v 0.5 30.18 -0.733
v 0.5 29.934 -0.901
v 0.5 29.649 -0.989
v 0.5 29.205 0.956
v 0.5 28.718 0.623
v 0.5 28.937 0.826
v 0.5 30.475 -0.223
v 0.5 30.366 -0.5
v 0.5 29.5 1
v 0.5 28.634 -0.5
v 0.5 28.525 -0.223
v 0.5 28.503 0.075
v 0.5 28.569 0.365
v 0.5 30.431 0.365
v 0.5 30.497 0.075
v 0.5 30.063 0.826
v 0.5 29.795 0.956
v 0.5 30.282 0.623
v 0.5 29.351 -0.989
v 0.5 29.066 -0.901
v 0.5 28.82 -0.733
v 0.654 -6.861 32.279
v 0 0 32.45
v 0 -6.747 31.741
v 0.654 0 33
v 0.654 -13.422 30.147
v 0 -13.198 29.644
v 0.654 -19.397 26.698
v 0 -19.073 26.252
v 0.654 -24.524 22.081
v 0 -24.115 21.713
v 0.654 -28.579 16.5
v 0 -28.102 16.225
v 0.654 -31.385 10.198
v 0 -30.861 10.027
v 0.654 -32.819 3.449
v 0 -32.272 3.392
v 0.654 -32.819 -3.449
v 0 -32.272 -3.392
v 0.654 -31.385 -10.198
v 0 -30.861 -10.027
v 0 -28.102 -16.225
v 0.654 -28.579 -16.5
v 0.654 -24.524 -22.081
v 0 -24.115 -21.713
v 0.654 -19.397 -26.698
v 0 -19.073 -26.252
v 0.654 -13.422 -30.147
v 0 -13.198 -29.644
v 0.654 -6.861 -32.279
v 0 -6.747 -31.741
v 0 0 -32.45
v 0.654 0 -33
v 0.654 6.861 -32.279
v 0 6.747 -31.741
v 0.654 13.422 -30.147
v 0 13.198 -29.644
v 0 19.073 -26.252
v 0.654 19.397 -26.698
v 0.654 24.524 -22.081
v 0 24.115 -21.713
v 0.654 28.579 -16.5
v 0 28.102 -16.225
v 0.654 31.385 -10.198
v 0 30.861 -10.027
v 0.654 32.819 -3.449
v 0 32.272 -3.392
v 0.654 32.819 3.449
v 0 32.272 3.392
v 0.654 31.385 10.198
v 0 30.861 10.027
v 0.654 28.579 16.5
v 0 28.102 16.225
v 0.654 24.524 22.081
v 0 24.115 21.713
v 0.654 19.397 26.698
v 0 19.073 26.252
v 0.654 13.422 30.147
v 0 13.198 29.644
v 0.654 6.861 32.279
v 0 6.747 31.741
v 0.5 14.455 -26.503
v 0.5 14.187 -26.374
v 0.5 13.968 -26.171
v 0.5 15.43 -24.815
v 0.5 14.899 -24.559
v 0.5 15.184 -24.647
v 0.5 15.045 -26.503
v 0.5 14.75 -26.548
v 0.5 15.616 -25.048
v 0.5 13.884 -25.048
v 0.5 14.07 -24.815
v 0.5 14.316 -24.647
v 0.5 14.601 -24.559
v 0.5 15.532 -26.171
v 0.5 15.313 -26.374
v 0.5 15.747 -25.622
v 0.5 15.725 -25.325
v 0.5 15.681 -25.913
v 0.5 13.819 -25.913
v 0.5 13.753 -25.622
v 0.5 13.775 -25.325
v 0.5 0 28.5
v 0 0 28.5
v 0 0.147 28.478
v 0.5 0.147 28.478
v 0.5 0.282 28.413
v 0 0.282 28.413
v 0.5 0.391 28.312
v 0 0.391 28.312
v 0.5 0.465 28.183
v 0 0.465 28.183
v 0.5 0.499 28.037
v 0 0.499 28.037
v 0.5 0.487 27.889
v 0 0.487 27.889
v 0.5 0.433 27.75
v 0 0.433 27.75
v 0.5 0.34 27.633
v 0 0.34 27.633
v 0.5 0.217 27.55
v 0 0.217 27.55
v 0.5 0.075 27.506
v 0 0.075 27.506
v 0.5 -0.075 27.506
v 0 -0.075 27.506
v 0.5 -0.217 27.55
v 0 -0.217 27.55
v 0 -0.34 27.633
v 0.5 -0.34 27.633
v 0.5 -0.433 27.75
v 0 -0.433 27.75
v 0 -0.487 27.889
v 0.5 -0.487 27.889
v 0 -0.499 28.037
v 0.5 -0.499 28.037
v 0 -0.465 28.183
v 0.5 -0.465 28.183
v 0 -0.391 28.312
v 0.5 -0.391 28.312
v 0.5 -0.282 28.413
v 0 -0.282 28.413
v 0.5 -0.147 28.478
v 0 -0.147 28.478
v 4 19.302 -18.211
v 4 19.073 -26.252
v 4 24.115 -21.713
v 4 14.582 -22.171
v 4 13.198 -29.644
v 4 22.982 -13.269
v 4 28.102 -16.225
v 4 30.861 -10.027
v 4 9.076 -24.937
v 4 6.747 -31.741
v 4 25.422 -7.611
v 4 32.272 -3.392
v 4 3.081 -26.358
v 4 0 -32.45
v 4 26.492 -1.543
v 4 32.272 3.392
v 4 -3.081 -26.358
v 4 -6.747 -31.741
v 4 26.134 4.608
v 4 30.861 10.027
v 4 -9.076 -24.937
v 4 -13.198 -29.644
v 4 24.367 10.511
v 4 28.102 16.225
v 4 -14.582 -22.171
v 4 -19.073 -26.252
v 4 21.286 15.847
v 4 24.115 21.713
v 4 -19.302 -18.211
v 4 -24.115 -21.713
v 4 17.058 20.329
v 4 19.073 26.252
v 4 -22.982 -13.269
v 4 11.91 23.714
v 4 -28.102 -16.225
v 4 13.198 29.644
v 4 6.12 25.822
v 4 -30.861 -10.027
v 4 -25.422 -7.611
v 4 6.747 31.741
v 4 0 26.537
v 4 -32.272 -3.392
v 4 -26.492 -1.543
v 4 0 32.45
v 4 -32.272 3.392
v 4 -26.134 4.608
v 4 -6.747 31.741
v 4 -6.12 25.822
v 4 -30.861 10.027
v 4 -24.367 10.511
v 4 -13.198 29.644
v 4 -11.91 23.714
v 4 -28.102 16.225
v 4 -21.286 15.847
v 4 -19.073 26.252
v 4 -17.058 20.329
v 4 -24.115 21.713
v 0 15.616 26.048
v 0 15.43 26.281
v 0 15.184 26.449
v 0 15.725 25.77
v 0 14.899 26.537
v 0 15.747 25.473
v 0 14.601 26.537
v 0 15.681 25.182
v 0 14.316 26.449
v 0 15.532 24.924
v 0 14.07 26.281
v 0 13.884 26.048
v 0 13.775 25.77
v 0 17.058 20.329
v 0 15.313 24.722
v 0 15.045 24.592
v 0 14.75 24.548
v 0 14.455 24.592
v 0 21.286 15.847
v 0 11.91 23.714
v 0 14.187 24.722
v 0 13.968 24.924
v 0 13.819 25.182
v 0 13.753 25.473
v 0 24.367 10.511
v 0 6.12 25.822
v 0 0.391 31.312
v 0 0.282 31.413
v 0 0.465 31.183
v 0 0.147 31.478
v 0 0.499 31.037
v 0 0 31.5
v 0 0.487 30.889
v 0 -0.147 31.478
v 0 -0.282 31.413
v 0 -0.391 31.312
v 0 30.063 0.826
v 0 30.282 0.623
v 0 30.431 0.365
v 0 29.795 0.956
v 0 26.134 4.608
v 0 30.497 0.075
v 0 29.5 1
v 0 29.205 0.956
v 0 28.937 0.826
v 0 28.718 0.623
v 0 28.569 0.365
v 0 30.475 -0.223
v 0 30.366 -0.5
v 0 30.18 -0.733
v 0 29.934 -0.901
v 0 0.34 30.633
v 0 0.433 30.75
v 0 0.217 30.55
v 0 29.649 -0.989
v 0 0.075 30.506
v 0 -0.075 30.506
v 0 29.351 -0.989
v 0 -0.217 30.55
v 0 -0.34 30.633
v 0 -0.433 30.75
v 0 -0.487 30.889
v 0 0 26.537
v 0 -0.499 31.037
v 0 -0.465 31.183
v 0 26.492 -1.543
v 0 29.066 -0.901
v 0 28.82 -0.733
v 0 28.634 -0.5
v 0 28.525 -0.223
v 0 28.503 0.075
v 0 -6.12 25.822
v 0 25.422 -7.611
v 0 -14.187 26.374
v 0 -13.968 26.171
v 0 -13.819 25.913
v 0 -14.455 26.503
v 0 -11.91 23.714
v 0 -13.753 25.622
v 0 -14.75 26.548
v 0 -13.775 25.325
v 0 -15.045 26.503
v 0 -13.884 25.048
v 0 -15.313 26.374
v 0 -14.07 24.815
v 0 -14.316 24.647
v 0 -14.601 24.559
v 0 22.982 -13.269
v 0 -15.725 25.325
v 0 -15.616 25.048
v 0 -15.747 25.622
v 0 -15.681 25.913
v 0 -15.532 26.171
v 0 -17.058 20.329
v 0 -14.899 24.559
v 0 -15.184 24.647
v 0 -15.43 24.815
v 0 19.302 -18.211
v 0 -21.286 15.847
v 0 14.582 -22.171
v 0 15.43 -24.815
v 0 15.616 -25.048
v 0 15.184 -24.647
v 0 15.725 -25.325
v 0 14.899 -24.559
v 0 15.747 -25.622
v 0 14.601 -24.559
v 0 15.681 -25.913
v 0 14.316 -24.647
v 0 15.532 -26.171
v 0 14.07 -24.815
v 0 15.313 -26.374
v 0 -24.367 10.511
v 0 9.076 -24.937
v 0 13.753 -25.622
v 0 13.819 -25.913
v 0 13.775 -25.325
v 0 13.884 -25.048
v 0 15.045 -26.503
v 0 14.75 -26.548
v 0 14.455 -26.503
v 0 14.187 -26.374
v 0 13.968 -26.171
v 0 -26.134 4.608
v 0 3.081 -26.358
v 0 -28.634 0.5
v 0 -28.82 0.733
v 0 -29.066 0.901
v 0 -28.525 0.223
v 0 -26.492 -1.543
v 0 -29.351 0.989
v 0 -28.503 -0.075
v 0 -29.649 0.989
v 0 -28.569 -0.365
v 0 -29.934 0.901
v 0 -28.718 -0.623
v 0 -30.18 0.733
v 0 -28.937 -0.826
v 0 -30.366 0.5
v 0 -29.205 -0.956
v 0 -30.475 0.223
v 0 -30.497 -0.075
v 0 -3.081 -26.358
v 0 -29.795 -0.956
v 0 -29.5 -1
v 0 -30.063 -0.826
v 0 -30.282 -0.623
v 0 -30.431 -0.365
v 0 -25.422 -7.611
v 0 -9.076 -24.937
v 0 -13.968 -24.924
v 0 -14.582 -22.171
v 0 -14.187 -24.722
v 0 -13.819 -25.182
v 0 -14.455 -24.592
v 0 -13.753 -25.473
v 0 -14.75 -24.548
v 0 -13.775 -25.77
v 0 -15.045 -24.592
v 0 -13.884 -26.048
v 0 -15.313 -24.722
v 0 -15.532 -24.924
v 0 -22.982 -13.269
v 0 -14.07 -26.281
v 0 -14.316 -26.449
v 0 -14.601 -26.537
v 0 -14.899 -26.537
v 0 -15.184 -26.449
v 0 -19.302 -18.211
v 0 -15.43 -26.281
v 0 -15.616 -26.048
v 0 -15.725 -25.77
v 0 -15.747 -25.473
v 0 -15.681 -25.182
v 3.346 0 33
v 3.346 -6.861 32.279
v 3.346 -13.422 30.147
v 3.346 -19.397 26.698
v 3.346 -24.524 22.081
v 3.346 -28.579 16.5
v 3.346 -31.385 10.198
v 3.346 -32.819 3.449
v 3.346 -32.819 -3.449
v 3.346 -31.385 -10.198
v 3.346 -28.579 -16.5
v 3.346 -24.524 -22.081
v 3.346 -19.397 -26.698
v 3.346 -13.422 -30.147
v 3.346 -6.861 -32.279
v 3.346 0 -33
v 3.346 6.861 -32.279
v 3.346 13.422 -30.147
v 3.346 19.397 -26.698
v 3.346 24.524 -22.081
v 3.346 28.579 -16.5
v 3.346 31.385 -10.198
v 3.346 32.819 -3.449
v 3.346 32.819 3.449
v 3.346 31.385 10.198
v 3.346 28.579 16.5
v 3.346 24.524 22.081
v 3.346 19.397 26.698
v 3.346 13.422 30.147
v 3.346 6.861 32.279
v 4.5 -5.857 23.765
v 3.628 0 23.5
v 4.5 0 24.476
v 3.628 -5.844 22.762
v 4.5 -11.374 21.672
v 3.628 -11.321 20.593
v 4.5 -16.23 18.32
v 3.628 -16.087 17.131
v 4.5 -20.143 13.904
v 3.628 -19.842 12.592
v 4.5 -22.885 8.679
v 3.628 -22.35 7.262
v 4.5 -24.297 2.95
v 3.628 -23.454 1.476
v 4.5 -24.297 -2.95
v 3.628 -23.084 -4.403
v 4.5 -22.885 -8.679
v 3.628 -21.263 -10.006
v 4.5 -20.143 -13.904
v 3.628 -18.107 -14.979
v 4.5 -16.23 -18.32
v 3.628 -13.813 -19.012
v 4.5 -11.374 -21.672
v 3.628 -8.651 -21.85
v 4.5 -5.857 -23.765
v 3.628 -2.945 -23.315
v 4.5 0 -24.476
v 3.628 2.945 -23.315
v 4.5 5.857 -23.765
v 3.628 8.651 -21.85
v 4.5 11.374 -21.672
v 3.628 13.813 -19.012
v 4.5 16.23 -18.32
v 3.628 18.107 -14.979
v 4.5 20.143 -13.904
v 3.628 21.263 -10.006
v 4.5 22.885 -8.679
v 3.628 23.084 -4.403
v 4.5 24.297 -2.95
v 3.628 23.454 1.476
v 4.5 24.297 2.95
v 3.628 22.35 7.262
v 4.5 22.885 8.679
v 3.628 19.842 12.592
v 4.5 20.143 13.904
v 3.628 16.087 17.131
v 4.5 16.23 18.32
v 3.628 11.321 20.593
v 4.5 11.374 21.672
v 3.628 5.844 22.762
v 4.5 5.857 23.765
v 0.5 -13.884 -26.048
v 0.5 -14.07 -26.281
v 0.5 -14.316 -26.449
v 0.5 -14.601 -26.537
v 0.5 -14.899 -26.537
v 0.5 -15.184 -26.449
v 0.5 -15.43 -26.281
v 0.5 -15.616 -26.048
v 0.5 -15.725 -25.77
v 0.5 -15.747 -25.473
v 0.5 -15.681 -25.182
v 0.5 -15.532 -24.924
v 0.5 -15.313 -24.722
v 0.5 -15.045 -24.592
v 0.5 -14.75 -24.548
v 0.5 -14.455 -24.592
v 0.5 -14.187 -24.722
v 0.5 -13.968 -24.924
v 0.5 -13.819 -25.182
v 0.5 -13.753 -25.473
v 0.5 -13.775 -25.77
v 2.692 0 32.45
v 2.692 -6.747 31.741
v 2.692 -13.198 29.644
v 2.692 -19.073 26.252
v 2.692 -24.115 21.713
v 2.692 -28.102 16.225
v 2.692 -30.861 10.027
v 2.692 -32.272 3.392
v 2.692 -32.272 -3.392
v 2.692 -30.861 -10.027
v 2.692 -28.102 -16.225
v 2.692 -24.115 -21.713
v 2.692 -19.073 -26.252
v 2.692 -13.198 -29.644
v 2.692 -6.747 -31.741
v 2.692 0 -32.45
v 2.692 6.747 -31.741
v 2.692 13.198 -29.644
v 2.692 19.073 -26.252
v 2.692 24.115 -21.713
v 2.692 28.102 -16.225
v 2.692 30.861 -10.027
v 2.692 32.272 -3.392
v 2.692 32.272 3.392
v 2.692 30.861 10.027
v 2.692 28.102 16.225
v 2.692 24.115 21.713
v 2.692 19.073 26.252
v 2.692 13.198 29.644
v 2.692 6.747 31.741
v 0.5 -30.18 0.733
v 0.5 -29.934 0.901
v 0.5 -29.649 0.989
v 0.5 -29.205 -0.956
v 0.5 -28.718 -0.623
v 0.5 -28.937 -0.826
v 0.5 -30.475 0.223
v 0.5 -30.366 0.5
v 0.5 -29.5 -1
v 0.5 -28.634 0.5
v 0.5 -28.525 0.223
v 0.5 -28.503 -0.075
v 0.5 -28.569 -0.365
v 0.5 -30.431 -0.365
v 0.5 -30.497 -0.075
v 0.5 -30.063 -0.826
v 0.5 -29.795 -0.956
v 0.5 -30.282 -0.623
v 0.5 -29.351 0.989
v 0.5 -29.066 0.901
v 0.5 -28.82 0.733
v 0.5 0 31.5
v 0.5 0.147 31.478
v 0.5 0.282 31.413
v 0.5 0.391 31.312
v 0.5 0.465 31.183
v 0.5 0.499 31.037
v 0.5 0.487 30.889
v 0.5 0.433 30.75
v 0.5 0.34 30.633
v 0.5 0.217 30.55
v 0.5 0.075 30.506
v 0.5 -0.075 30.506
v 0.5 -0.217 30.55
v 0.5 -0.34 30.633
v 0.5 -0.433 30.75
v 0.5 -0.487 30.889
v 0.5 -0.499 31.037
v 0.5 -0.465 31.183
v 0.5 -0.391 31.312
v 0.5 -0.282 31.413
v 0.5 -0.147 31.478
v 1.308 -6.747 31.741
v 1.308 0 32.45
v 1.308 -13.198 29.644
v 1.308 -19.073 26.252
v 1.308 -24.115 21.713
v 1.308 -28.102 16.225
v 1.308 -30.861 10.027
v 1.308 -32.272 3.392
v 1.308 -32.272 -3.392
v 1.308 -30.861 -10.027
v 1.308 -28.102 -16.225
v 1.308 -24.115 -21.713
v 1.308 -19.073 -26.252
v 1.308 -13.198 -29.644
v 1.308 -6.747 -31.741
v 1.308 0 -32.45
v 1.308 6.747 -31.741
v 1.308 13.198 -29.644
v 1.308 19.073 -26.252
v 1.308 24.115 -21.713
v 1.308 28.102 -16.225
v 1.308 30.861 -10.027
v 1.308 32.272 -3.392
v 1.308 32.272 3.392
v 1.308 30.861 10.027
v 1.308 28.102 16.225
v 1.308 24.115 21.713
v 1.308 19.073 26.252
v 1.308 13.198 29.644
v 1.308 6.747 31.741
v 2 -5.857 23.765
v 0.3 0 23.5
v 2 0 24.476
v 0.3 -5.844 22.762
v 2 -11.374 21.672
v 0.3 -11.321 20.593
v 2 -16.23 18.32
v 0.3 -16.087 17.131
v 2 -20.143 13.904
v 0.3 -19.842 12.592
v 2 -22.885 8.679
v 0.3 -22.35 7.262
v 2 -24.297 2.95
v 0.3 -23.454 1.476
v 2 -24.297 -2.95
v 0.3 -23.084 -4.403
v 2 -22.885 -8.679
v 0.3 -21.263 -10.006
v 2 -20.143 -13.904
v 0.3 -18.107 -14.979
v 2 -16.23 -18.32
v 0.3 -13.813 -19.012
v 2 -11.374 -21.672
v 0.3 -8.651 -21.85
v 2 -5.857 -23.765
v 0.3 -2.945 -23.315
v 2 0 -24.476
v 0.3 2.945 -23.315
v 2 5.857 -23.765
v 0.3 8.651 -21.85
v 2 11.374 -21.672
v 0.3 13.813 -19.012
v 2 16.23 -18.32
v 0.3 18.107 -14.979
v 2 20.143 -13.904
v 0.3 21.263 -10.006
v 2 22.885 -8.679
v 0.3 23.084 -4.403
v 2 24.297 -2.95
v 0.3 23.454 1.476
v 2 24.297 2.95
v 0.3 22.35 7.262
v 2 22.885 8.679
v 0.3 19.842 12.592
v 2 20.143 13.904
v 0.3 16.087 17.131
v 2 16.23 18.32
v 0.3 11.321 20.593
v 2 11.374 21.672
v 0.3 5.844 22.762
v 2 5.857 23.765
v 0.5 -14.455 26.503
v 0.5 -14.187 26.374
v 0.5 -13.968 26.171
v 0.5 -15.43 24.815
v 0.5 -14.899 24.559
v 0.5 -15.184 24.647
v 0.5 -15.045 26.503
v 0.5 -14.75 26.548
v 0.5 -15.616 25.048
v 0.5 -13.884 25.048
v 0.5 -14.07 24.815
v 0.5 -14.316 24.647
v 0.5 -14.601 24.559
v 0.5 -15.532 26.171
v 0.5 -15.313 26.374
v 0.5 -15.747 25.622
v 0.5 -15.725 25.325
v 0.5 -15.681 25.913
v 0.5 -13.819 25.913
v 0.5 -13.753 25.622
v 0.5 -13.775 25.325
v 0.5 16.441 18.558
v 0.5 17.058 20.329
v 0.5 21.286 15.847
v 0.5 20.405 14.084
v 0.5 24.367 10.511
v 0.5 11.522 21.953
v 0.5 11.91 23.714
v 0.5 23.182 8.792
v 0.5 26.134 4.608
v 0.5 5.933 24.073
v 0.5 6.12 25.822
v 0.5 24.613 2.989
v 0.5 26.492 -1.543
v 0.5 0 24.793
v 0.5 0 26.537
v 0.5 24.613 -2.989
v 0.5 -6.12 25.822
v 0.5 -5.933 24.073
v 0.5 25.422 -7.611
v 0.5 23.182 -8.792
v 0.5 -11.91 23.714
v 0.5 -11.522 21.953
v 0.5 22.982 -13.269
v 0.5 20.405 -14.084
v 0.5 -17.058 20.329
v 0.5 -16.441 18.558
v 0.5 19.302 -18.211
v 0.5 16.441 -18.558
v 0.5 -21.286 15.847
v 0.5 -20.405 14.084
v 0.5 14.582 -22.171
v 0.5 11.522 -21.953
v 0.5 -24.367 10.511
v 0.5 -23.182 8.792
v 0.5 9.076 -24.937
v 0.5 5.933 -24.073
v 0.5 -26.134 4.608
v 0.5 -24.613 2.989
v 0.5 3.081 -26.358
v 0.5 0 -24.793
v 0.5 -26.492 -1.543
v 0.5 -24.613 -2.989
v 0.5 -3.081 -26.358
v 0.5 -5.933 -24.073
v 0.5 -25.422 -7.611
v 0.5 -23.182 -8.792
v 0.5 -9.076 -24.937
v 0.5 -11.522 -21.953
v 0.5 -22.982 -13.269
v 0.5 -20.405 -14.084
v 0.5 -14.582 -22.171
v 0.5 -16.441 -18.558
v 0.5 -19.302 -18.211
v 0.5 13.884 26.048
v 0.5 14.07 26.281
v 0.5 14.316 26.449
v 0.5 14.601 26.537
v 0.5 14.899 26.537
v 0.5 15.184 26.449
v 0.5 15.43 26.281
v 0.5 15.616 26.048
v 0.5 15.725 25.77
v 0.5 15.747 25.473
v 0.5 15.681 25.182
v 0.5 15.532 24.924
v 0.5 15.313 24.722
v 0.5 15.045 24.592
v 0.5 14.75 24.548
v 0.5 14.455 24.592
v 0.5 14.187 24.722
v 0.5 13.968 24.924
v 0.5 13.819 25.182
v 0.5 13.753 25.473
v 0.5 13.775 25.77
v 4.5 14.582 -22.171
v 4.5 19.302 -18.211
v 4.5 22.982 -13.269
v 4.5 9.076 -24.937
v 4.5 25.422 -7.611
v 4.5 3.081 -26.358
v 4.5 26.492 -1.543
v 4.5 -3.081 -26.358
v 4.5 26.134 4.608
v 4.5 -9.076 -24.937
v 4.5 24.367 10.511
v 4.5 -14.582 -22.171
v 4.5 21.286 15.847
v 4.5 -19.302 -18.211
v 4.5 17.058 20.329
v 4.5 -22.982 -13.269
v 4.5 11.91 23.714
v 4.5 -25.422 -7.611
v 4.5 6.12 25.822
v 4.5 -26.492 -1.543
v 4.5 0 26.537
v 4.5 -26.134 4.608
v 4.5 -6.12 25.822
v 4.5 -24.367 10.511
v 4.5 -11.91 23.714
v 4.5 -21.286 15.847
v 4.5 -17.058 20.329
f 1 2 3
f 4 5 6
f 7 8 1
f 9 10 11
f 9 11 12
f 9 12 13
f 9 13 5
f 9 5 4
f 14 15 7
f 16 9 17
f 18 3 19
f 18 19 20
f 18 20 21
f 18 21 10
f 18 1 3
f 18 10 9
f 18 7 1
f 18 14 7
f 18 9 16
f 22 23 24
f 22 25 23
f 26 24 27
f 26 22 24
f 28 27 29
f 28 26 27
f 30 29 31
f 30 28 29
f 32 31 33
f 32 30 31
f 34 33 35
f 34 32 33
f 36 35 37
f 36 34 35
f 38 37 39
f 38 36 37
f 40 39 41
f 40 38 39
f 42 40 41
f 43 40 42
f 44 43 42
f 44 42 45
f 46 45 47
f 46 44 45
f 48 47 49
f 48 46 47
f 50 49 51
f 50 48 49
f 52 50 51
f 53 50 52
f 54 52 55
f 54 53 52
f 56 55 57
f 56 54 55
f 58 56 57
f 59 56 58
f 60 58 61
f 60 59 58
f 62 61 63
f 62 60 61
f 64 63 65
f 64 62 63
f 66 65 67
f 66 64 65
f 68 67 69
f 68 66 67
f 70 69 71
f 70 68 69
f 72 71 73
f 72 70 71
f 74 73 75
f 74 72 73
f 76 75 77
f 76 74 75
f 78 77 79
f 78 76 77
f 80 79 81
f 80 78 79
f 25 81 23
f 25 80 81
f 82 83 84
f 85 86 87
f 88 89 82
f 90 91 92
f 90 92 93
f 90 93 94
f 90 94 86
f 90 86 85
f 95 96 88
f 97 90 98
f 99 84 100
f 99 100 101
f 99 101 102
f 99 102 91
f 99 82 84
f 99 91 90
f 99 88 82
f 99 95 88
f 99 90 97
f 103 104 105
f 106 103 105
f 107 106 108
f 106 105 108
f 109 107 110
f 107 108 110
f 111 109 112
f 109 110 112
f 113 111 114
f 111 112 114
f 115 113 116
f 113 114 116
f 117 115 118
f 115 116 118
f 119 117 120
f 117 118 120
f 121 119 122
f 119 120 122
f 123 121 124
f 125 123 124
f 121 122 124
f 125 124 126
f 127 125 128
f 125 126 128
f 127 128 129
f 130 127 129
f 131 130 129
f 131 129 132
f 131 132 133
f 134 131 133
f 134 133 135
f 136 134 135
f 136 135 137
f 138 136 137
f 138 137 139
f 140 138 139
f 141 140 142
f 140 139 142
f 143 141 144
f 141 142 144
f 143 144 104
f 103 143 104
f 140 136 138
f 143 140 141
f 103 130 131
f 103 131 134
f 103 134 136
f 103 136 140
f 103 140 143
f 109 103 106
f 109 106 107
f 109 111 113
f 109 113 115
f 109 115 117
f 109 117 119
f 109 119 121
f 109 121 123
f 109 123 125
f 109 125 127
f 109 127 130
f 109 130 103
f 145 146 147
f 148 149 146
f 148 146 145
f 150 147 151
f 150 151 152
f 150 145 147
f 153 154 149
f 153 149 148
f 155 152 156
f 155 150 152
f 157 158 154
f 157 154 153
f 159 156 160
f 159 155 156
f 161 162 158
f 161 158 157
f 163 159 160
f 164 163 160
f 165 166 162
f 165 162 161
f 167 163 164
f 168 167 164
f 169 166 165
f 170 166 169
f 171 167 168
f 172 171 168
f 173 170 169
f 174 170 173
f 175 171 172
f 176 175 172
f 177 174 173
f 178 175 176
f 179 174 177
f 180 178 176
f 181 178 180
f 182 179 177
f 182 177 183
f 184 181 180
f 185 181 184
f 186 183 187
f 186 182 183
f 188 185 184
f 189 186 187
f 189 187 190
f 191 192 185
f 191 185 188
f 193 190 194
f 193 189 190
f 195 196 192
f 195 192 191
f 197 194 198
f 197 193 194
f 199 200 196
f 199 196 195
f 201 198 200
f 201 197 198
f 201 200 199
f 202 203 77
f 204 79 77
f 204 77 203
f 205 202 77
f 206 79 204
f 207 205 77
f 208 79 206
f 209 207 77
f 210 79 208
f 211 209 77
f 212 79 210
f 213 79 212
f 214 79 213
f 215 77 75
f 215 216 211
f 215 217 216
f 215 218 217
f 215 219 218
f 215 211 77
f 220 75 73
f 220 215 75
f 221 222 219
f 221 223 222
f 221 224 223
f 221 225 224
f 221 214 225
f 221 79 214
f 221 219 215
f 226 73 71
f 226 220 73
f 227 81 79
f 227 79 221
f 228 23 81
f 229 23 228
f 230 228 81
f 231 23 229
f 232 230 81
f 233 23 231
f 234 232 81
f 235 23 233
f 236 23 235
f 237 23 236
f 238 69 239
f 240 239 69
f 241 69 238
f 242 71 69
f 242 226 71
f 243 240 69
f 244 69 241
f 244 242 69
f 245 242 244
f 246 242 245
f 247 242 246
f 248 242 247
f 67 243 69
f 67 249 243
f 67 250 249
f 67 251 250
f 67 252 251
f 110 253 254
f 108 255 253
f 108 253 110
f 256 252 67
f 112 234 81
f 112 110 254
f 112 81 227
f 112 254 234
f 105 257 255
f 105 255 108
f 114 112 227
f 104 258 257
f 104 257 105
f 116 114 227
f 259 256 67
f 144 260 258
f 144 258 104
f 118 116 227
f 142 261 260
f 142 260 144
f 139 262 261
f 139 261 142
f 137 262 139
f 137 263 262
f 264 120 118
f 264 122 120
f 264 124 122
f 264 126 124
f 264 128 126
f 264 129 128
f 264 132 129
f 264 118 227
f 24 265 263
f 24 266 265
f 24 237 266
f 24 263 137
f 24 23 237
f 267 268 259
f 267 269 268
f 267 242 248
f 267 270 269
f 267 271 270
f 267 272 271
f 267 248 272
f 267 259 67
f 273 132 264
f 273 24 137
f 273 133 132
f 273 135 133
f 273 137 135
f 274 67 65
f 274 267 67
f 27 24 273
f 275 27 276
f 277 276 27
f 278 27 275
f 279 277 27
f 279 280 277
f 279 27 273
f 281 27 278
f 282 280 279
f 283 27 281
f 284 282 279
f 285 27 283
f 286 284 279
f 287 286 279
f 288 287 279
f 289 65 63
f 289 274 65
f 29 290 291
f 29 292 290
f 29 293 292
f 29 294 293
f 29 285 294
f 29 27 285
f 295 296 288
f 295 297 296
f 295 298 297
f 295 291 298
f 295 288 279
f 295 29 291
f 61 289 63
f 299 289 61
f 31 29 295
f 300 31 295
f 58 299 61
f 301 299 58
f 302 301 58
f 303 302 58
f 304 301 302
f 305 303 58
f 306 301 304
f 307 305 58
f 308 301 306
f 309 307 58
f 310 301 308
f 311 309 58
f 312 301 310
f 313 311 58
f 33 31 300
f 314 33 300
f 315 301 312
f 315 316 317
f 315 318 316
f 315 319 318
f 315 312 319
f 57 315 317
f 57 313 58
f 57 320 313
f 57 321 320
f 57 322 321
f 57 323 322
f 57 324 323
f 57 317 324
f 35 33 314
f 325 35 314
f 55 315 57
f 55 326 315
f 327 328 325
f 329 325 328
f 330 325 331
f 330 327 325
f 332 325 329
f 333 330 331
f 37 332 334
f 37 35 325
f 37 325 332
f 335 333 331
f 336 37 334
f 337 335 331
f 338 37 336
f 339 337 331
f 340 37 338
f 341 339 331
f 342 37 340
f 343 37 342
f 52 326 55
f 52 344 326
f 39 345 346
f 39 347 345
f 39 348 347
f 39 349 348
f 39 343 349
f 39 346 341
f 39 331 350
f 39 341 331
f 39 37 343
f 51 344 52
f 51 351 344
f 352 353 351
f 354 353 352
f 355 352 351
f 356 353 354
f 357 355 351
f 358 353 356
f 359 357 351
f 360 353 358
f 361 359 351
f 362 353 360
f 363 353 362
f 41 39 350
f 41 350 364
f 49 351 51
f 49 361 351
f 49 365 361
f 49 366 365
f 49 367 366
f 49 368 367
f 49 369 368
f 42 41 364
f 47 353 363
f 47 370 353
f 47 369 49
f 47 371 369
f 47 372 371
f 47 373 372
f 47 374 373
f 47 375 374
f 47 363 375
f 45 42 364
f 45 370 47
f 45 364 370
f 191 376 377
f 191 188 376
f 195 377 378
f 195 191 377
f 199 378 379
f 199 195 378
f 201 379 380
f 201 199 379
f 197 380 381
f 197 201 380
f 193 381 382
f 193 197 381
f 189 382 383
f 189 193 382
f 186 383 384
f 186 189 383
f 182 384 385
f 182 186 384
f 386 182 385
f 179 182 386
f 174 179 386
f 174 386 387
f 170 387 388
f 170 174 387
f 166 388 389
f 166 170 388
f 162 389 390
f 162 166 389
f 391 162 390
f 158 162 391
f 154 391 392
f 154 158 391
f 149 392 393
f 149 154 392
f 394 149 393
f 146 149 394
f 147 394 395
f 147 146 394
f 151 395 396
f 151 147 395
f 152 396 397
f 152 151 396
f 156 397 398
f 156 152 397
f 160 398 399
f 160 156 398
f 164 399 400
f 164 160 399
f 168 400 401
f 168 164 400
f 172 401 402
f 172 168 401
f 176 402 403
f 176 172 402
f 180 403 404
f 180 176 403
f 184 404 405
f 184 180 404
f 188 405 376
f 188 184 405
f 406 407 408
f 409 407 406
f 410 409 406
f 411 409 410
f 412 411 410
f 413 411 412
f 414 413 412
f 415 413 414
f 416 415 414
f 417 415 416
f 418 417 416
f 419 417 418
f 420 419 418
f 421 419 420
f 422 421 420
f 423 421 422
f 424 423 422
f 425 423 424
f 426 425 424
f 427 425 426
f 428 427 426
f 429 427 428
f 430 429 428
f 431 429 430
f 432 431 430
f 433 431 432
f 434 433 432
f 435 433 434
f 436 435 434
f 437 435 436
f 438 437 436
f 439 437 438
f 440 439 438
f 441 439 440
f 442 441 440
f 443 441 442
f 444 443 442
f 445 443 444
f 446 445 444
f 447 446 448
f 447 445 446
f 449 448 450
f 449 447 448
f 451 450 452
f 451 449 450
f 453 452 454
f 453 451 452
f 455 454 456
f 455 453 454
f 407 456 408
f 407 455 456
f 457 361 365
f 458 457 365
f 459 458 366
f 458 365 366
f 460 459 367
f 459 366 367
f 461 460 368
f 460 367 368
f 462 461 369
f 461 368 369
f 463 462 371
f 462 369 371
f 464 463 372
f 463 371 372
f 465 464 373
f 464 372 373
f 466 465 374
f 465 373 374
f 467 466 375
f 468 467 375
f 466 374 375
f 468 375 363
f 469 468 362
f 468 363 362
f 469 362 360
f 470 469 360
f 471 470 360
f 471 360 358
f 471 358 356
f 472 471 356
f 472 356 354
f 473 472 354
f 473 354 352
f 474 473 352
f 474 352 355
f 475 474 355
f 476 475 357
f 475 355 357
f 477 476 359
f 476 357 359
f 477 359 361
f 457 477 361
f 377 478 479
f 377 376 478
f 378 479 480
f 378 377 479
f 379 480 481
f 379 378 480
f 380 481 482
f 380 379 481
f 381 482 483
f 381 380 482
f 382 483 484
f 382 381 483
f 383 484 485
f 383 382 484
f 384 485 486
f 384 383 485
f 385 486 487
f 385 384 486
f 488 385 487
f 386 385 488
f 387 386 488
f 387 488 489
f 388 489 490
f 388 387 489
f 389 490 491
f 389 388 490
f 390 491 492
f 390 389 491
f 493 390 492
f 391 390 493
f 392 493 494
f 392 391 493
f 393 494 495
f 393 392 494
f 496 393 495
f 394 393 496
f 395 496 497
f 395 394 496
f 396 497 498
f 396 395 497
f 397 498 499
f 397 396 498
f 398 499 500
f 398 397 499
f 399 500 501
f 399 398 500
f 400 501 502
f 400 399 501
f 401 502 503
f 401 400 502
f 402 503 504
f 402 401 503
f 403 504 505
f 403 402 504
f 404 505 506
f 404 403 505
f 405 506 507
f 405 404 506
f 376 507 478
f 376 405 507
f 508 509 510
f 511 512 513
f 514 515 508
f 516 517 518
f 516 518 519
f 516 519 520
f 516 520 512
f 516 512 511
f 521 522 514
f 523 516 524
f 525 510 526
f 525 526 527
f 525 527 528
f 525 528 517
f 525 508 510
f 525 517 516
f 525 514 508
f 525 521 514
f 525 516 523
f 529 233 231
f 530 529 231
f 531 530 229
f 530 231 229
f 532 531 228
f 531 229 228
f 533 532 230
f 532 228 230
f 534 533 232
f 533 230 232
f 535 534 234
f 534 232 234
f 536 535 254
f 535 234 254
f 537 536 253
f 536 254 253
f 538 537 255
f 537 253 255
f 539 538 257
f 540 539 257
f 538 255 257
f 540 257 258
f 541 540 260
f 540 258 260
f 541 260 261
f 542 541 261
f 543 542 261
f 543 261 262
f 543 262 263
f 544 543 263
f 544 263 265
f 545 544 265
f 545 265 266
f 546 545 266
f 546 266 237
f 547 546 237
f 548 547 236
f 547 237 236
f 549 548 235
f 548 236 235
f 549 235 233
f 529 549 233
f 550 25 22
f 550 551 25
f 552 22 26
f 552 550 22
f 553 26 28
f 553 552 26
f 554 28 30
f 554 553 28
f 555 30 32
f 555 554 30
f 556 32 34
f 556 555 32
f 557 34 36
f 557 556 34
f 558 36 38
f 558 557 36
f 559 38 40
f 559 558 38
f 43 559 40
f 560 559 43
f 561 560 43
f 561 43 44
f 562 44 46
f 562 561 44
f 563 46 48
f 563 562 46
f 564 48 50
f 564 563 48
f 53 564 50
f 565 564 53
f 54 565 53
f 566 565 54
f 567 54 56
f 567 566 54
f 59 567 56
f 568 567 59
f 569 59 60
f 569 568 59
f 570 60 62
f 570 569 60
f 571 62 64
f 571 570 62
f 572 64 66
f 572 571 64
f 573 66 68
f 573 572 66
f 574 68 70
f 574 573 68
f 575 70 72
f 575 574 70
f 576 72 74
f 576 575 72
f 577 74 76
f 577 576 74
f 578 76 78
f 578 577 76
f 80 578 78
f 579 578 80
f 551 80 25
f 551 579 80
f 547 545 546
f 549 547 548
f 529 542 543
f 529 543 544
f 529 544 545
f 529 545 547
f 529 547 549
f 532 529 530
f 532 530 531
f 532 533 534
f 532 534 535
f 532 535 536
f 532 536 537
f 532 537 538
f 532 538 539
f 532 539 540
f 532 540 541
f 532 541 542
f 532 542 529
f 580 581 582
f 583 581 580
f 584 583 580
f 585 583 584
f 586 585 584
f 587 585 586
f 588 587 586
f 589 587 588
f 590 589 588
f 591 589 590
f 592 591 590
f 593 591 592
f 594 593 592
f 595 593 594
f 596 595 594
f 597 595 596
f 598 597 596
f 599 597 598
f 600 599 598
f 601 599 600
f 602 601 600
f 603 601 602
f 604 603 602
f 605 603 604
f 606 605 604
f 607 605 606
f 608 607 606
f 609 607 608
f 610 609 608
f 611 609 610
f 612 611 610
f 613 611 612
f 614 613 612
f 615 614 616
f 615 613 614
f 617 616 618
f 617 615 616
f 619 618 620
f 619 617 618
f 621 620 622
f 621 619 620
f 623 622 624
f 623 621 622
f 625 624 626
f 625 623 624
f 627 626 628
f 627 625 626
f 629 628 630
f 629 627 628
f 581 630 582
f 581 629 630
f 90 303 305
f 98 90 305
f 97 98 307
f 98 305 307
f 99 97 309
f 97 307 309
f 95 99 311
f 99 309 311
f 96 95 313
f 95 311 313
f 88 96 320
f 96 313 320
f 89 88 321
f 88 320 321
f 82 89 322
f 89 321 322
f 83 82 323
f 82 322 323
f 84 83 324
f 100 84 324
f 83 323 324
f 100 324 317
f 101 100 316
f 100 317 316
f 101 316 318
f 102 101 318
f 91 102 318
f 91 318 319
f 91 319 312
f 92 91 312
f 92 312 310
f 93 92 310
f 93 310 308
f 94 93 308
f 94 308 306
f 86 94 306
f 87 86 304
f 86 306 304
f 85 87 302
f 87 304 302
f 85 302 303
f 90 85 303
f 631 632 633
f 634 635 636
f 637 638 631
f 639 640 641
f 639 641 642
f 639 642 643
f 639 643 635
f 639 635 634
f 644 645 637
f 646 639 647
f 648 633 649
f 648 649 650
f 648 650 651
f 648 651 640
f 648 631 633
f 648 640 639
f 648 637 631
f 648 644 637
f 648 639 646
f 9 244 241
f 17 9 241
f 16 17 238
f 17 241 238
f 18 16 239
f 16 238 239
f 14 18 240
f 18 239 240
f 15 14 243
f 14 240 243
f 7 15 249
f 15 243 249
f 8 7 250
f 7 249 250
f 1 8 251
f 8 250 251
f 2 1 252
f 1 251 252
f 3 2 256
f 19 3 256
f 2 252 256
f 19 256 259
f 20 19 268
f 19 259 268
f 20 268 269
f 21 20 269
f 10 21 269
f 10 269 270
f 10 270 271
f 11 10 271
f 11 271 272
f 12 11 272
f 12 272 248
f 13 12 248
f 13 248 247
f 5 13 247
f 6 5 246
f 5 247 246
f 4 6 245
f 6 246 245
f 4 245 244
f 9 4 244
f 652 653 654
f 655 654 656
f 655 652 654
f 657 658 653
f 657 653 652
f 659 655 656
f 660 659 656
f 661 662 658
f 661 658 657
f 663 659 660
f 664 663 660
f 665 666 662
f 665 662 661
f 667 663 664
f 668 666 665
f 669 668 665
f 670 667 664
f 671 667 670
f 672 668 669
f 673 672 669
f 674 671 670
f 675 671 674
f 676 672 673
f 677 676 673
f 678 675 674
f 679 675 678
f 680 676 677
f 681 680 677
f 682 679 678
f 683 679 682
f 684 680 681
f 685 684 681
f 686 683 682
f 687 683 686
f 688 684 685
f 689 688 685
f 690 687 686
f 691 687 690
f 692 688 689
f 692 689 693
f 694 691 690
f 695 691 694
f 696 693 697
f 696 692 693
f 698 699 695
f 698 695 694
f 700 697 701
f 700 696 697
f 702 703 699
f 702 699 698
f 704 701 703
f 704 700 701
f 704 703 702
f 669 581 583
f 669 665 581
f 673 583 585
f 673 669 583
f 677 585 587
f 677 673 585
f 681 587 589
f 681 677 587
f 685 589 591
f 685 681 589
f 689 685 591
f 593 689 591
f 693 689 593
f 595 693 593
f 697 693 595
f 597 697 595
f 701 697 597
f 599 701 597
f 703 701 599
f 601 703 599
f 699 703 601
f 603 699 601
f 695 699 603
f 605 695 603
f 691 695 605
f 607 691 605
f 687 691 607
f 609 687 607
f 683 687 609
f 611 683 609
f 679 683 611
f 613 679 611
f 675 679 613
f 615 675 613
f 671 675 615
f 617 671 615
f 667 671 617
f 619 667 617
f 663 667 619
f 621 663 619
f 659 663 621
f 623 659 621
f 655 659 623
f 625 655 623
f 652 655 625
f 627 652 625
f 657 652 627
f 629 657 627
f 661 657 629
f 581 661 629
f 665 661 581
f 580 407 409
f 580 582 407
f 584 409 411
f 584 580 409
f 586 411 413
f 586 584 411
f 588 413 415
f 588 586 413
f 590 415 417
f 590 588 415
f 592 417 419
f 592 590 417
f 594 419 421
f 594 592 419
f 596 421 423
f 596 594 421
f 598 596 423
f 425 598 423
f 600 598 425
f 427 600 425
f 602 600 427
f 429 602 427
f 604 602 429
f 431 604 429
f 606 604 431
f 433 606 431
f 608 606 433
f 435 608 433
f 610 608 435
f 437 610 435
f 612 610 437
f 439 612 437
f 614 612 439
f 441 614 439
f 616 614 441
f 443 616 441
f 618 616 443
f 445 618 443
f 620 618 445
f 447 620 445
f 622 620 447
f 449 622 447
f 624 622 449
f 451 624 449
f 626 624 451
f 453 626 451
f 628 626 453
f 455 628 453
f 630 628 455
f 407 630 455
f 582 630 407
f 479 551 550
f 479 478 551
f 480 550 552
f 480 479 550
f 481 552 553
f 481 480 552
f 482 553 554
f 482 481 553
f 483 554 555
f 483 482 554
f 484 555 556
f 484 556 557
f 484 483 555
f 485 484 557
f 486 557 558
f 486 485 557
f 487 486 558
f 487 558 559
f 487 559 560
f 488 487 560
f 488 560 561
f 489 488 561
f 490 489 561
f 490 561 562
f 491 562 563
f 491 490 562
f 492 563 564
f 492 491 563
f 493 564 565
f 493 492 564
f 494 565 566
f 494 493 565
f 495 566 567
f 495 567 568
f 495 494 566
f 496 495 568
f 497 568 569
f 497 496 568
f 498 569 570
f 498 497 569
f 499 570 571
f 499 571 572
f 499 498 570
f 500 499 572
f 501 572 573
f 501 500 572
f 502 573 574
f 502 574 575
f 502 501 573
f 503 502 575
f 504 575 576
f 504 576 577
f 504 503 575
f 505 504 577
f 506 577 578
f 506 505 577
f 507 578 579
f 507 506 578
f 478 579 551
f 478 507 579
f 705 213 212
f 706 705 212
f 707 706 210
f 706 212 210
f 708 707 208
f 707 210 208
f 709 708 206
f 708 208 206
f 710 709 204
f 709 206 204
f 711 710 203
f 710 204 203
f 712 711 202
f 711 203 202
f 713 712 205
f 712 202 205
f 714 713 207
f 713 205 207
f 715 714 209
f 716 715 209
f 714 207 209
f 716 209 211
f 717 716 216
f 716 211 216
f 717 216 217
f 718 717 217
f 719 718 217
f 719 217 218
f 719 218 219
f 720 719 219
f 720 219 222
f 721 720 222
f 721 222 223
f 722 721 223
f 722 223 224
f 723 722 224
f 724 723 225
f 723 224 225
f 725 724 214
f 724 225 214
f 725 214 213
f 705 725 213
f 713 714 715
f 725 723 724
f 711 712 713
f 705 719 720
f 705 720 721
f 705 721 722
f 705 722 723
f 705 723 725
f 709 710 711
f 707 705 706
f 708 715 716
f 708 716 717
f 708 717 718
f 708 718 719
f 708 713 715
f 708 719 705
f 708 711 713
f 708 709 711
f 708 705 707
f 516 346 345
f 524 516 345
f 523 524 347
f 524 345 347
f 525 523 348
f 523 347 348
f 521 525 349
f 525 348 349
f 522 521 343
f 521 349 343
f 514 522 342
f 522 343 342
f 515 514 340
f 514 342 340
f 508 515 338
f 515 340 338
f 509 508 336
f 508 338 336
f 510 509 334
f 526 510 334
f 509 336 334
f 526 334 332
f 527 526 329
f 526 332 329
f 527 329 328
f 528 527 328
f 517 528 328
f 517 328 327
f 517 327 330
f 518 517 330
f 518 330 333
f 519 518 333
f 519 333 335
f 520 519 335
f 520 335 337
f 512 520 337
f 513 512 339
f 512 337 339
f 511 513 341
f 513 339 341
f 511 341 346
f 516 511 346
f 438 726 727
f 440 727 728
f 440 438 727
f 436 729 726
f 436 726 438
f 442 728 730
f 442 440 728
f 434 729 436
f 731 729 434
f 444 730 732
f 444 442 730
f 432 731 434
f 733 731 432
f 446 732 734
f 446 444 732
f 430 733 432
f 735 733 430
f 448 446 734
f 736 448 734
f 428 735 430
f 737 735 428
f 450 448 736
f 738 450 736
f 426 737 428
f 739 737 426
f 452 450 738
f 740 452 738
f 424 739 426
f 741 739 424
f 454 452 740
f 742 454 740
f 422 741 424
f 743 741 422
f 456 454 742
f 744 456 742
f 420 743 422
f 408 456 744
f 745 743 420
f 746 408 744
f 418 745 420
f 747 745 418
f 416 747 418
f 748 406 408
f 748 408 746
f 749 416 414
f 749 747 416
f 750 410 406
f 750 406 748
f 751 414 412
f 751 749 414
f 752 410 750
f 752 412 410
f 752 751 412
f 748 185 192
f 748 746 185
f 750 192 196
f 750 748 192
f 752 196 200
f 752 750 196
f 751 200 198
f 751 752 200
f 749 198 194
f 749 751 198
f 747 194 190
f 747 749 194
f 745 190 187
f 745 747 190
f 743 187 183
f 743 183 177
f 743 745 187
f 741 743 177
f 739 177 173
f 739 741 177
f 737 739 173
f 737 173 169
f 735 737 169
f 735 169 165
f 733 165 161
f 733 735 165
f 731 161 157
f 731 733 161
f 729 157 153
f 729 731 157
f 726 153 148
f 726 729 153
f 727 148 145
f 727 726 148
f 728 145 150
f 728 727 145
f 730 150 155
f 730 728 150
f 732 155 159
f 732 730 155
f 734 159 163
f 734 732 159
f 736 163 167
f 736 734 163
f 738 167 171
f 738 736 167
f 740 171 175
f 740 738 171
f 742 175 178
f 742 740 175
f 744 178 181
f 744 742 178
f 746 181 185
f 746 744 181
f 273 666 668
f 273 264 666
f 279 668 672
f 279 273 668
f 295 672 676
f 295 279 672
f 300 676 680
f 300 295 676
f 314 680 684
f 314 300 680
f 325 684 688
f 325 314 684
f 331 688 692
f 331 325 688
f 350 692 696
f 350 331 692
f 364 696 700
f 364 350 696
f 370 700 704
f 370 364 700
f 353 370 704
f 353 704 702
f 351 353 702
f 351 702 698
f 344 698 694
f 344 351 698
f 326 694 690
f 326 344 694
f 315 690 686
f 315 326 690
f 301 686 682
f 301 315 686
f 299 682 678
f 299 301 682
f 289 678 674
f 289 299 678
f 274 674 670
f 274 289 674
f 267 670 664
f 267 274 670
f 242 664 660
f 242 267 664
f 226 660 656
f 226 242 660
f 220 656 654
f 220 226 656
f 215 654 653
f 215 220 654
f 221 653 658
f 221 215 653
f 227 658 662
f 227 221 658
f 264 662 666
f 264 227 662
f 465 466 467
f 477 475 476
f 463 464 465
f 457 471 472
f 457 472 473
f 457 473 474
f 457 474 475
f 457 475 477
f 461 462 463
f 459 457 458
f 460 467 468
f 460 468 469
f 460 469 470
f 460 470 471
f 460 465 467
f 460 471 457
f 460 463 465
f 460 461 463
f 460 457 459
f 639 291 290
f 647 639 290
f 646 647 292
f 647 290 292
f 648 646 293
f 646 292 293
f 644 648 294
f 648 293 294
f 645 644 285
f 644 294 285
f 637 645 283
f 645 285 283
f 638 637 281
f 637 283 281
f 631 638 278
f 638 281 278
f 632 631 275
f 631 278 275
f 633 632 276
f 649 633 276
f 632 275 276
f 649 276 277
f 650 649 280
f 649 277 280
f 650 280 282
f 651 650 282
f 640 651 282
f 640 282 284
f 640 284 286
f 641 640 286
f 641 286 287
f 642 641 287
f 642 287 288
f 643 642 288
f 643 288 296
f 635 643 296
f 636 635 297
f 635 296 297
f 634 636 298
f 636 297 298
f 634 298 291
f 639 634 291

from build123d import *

# Parameters (mm, degrees)
ESQUISSE2_R                  = 1
ENL_V_MAT_EXTRU_1_DEPTH      = 0.5
R_P_TITION_CIRCULAIRE1_COUNT = 6
ESQUISSE5_R                  = 0.5
ENL_V_MAT_EXTRU_2_DEPTH      = 0.5


with BuildPart() as part:
    # Esquisse1 → Base-Révolution (revolve)
    with BuildSketch(Plane.XY):
        Polygon((0, 32.449656843), (0.653785579, 33), (1.307571158, 32.449656843), (2.692428842, 32.449656843), (3.346214421, 33), (4, 32.449656843), (4, 26.537069046), (4.5, 26.537069046), (4.5, 24.475834219), (3.627749385, 23.5), (2, 24.475834219), (0.3, 23.5), (0.5, 24.793358266), (0.5, 26.537069046), (0, 26.537069046), align=None)
    revolve(axis=Axis((0, 0, 0), (1, 0, 0)))

    # Esquisse2 → Enlèv. mat.-Extru.1 (cut)
    with BuildSketch(Plane.ZY):
        with Locations((0, 29.5)):
            Circle(ESQUISSE2_R)
    enl_v_mat_extru_1 = extrude(amount=-ENL_V_MAT_EXTRU_1_DEPTH, mode=Mode.SUBTRACT)

    # Répétition circulaire1: Enlèv. mat.-Extru.1 ×6 about axis
    r_p_tition_circulaire1_axis = Axis((-2.3625, 0, 0), (1, 0, 0))
    for i in range(1, R_P_TITION_CIRCULAIRE1_COUNT):
        add(enl_v_mat_extru_1.rotate(r_p_tition_circulaire1_axis, i * 360 / R_P_TITION_CIRCULAIRE1_COUNT), mode=Mode.SUBTRACT)

    # Esquisse5 → Enlèv. mat.-Extru.2 (cut)
    with BuildSketch(Plane.ZY):
        with Locations((31, 0)):
            Circle(ESQUISSE5_R)
        with Locations((28, 0)):
            Circle(ESQUISSE5_R)
    extrude(amount=-ENL_V_MAT_EXTRU_2_DEPTH, mode=Mode.SUBTRACT)


solid = part.part
